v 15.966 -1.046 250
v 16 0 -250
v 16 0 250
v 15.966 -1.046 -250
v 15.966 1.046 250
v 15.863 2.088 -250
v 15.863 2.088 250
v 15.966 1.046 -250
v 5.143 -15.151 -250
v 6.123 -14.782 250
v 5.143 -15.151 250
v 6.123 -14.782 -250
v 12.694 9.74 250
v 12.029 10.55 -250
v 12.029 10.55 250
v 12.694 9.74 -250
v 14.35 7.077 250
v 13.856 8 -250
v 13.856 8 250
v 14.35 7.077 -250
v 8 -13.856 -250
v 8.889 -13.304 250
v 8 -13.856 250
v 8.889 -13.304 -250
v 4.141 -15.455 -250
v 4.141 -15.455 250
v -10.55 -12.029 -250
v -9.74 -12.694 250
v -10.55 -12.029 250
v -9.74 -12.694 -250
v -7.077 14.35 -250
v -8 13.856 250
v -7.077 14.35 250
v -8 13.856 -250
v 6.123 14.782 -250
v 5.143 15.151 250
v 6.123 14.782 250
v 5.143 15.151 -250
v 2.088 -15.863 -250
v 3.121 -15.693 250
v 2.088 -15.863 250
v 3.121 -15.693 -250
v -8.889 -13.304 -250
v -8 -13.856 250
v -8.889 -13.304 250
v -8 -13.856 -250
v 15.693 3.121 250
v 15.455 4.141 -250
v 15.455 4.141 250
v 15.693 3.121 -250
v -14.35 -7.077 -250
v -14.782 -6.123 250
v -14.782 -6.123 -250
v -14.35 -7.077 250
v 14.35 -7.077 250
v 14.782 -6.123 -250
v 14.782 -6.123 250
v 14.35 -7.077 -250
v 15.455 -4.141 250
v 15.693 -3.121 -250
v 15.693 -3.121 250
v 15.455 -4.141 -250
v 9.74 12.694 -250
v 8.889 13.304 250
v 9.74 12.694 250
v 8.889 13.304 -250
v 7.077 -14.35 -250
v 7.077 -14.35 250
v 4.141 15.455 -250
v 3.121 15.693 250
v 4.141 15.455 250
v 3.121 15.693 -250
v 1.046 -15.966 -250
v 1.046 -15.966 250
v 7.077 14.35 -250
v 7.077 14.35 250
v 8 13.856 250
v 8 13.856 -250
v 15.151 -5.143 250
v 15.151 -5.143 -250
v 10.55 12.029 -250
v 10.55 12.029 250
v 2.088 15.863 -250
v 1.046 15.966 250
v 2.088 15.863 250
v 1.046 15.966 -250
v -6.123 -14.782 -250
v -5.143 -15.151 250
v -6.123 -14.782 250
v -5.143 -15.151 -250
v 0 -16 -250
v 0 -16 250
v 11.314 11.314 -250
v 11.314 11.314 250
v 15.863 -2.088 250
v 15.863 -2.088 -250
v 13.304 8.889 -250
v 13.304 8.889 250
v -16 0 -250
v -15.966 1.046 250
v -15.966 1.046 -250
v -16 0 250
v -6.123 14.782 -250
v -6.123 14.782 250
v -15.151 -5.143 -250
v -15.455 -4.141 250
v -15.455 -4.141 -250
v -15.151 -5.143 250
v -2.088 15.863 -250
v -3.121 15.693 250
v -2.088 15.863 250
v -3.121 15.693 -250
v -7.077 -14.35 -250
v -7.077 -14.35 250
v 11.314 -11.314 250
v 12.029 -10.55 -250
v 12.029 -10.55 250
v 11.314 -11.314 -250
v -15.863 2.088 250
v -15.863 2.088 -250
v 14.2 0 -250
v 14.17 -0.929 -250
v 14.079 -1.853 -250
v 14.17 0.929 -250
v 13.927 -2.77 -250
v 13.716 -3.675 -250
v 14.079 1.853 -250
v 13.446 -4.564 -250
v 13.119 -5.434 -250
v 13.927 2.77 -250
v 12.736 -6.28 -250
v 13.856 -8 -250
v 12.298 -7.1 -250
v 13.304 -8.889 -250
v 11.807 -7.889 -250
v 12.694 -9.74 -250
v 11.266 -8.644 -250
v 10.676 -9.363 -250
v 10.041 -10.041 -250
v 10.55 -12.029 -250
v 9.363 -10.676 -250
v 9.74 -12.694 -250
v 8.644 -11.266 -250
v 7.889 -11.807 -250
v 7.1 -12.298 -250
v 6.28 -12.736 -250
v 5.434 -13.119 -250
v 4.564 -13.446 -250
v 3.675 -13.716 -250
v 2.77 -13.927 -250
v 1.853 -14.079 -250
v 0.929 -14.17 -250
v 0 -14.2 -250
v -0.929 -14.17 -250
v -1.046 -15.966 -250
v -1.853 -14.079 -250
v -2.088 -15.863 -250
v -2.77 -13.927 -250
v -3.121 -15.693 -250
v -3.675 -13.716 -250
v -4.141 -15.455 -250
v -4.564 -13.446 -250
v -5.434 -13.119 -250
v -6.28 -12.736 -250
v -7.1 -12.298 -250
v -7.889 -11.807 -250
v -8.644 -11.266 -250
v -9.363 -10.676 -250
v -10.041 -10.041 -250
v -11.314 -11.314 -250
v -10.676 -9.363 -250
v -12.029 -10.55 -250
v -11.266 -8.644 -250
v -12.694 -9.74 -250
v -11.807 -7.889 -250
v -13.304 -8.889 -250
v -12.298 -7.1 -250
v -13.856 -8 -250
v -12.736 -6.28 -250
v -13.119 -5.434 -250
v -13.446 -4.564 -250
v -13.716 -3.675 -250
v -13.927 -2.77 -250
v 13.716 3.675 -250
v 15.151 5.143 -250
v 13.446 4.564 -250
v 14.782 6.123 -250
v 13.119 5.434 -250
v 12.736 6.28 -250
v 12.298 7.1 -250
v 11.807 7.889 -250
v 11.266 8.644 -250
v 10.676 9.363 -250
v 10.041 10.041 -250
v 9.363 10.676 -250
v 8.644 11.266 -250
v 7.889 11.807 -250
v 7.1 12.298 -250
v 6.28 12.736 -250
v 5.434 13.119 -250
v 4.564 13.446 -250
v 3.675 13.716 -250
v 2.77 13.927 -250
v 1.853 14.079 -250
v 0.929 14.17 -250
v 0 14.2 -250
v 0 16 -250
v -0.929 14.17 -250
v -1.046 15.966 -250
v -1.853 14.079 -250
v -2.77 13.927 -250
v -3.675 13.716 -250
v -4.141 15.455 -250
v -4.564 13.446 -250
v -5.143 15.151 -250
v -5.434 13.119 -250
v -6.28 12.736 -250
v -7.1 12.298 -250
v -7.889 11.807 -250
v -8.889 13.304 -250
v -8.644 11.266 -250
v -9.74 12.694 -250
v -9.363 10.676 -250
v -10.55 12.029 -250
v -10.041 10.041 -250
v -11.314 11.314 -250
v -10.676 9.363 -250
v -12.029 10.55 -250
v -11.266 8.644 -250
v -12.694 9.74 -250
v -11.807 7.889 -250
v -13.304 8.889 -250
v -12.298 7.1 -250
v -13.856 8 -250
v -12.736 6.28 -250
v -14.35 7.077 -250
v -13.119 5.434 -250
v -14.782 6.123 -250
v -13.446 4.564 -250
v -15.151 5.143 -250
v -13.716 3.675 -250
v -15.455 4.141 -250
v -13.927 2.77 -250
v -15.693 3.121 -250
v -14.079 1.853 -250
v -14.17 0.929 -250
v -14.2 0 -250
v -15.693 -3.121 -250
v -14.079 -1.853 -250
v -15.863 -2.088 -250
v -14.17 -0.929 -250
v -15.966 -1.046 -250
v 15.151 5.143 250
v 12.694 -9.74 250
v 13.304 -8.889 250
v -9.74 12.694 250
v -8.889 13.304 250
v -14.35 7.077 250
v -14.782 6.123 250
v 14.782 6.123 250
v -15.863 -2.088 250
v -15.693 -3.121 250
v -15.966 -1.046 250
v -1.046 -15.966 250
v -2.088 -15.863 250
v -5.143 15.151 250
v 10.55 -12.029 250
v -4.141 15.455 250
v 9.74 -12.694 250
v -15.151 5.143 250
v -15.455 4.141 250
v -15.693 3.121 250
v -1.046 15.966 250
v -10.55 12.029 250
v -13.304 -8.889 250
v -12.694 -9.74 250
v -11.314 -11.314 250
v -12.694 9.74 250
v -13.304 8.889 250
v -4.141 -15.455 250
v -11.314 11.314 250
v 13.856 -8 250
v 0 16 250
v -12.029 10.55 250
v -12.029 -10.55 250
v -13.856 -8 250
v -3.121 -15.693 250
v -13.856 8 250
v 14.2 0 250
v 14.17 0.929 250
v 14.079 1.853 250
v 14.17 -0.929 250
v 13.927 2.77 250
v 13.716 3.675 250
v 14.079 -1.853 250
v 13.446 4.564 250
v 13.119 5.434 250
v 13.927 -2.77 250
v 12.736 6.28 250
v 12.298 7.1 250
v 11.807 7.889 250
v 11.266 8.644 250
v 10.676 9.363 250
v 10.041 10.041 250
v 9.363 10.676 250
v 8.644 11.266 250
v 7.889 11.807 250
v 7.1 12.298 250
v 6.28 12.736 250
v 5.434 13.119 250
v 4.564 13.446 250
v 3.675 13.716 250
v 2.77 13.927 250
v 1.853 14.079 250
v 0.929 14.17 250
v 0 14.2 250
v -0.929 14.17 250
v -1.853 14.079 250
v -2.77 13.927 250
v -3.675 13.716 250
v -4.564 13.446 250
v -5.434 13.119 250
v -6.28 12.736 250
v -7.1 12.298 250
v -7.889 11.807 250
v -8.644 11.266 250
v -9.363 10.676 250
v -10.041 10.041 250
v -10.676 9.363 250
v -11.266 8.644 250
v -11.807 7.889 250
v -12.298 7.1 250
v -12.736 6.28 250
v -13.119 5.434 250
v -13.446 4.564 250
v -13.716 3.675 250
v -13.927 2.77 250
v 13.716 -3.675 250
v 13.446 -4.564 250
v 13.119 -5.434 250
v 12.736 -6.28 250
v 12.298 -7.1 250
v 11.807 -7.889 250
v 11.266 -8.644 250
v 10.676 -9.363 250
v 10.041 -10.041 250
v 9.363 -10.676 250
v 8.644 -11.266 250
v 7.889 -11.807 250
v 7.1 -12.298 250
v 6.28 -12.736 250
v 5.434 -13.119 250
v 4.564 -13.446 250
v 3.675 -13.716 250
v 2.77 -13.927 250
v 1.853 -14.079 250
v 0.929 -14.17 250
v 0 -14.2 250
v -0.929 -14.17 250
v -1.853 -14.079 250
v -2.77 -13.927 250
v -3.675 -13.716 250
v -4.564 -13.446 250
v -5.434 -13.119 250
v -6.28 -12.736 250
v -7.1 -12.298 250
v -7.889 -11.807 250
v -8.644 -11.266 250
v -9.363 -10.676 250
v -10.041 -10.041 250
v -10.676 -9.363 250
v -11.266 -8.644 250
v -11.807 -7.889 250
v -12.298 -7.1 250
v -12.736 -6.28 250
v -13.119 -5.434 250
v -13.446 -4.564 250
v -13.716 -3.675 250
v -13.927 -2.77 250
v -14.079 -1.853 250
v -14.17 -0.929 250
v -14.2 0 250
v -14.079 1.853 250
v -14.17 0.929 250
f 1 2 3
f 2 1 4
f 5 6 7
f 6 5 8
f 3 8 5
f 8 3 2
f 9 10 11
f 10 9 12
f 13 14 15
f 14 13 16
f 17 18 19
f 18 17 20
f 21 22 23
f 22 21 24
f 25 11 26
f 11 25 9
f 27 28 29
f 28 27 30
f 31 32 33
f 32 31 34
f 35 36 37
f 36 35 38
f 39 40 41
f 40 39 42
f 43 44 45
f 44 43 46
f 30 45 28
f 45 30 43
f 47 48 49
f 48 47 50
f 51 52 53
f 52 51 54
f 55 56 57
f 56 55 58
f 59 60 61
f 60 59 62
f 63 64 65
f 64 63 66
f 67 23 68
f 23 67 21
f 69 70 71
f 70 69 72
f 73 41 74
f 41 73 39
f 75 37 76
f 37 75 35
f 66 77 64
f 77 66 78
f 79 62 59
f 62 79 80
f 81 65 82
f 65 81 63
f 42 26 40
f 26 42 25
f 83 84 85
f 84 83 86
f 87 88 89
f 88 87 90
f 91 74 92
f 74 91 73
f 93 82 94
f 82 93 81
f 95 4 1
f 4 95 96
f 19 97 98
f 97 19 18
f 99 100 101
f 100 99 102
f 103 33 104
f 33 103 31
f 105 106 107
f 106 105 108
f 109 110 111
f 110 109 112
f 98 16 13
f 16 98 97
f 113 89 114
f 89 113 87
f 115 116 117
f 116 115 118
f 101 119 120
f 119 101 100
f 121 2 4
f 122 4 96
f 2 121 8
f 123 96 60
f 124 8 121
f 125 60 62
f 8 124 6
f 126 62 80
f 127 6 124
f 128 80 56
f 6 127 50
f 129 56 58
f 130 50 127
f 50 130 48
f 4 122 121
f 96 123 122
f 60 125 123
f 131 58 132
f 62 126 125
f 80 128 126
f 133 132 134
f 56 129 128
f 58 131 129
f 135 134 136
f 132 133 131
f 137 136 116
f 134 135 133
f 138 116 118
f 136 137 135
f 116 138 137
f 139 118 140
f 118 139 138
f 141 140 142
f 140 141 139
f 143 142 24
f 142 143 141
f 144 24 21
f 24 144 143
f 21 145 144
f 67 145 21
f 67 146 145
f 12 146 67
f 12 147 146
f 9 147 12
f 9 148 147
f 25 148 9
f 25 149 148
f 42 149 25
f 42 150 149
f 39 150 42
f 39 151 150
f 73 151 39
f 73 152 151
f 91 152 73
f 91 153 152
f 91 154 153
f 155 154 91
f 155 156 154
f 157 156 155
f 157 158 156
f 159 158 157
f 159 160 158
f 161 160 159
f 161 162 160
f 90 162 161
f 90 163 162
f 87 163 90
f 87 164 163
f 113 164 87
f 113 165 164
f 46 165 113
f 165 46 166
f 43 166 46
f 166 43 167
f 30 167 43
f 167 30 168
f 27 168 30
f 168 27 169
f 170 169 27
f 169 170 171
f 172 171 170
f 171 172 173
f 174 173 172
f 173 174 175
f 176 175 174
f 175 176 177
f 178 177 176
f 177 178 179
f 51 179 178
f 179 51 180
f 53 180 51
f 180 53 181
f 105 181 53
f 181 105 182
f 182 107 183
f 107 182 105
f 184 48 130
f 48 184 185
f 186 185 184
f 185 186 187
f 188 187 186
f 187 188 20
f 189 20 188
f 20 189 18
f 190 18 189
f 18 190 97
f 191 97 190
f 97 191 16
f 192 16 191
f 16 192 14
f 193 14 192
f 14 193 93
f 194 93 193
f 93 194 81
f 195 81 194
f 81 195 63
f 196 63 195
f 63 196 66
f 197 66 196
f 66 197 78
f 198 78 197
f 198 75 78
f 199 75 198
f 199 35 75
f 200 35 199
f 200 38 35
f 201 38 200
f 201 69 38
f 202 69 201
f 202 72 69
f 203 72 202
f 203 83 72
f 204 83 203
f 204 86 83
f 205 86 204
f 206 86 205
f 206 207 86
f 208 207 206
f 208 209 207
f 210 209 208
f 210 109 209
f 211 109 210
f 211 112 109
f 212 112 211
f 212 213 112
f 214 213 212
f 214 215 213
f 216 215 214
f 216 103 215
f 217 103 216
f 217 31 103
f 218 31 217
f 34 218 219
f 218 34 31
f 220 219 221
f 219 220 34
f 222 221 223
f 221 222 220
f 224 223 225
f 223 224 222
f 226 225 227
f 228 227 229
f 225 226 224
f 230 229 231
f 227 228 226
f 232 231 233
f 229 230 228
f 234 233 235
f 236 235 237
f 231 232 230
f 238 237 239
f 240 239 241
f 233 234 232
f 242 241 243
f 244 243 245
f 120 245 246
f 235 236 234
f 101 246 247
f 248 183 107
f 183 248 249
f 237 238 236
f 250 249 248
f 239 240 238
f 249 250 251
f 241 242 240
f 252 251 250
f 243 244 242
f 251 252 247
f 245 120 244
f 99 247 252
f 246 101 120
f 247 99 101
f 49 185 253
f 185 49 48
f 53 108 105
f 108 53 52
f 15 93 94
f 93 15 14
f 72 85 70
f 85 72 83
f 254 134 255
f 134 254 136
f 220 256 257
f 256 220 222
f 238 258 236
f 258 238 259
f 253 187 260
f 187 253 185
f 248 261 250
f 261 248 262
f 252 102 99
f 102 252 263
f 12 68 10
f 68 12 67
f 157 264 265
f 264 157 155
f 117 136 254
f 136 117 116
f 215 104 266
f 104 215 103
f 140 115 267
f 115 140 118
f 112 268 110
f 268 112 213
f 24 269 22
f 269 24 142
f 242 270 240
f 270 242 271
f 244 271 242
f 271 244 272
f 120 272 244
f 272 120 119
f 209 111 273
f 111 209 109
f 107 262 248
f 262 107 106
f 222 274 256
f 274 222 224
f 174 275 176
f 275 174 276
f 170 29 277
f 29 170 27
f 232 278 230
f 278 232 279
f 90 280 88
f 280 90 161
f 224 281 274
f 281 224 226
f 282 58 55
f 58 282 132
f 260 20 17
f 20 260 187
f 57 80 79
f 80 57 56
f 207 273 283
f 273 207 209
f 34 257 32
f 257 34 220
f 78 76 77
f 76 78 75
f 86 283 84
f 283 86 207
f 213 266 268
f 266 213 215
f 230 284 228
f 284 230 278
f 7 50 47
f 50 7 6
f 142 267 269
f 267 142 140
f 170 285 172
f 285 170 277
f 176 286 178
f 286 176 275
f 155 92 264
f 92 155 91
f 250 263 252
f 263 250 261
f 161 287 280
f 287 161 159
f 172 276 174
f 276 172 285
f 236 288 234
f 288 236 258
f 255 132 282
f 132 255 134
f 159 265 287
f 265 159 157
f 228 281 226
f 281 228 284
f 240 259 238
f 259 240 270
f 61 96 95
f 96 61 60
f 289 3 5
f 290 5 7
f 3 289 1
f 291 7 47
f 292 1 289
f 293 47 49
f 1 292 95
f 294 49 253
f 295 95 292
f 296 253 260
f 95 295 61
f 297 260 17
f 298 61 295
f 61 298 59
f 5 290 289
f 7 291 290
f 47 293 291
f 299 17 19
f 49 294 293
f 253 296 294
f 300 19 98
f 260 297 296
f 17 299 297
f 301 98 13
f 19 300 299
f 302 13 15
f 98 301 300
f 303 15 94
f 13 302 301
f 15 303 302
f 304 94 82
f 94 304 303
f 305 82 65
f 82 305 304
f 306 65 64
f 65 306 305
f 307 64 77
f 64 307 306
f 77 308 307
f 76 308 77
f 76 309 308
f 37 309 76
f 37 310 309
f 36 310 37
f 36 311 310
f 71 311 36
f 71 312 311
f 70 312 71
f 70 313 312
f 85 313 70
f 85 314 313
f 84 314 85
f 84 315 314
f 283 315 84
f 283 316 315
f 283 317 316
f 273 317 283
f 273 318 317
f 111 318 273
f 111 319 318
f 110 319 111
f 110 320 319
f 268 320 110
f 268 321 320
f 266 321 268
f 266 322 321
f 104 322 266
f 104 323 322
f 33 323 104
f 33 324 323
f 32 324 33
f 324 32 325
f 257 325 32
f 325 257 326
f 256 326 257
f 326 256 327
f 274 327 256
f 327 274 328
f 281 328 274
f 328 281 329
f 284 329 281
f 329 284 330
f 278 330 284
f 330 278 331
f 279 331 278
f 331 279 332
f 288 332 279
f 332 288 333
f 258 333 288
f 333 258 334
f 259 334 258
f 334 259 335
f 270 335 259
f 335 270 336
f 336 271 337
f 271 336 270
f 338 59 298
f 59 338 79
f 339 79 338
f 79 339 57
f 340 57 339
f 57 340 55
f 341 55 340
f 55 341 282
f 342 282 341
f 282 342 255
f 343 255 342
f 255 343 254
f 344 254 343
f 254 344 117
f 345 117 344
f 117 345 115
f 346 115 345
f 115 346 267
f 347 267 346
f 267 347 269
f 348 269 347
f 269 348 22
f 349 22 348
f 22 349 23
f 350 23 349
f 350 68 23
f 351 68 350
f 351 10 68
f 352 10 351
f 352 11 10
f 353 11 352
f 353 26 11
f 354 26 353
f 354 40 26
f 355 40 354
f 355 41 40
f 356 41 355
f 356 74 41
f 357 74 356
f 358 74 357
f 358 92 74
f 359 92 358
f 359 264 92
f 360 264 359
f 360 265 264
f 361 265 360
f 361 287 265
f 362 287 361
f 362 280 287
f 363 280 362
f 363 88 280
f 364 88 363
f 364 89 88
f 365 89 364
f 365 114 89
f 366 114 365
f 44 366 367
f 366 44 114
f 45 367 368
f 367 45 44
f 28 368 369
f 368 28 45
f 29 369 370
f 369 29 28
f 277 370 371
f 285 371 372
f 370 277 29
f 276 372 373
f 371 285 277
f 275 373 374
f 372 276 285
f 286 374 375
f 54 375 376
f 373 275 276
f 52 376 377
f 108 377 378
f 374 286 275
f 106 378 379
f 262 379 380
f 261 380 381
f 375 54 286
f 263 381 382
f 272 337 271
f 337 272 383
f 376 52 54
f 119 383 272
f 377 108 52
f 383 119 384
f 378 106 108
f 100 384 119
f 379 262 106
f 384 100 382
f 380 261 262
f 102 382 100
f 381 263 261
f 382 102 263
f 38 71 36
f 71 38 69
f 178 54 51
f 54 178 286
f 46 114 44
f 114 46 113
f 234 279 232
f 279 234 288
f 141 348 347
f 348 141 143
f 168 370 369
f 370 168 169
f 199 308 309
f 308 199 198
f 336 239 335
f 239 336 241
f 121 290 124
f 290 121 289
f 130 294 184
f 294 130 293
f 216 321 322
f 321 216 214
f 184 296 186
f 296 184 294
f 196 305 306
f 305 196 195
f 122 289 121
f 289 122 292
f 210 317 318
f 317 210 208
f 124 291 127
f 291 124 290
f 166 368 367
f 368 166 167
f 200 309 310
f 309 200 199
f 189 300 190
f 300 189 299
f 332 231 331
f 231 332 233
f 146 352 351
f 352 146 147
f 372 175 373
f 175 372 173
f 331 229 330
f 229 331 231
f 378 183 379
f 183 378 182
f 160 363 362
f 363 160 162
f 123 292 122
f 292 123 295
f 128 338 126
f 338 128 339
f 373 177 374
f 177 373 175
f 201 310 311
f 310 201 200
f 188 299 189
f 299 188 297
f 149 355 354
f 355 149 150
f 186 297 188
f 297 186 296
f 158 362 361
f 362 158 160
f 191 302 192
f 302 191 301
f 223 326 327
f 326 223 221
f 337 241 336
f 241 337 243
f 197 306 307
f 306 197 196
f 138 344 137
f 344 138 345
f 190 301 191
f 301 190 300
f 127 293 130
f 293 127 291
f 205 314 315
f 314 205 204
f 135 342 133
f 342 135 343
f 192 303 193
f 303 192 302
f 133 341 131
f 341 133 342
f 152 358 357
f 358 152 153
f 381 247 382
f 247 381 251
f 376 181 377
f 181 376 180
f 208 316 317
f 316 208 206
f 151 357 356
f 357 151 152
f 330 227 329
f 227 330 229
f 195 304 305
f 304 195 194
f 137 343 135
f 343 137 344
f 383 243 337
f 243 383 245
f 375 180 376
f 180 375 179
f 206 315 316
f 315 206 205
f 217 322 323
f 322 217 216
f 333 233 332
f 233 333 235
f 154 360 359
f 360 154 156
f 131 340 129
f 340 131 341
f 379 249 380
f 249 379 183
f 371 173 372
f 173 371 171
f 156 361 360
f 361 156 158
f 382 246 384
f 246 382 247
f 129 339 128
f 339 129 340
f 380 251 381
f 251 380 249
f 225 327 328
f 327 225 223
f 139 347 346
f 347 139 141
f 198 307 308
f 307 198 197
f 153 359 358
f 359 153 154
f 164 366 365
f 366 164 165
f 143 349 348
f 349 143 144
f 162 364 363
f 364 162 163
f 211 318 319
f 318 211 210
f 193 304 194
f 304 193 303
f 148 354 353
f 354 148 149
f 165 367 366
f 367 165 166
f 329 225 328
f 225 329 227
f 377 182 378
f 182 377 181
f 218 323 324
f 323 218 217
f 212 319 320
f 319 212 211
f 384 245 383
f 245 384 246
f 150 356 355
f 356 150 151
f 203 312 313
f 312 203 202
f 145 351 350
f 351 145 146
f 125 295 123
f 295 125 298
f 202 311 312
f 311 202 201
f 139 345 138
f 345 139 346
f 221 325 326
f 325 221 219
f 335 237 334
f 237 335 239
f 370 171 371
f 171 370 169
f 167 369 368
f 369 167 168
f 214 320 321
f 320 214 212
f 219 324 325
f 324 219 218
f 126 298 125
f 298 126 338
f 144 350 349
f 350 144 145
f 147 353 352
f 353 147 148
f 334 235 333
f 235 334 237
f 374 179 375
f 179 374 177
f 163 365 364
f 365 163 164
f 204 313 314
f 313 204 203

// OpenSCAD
$fn=96;

pipe_length = 500;
od = 32;
wall = 1.8;
id = od - 2*wall;

module ht_pipe(len, outer_d, inner_d){
    difference(){
        cylinder(h=len, d=outer_d, center=true);
        cylinder(h=len+2, d=inner_d, center=true);
    }
}

ht_pipe(pipe_length, od, id);
